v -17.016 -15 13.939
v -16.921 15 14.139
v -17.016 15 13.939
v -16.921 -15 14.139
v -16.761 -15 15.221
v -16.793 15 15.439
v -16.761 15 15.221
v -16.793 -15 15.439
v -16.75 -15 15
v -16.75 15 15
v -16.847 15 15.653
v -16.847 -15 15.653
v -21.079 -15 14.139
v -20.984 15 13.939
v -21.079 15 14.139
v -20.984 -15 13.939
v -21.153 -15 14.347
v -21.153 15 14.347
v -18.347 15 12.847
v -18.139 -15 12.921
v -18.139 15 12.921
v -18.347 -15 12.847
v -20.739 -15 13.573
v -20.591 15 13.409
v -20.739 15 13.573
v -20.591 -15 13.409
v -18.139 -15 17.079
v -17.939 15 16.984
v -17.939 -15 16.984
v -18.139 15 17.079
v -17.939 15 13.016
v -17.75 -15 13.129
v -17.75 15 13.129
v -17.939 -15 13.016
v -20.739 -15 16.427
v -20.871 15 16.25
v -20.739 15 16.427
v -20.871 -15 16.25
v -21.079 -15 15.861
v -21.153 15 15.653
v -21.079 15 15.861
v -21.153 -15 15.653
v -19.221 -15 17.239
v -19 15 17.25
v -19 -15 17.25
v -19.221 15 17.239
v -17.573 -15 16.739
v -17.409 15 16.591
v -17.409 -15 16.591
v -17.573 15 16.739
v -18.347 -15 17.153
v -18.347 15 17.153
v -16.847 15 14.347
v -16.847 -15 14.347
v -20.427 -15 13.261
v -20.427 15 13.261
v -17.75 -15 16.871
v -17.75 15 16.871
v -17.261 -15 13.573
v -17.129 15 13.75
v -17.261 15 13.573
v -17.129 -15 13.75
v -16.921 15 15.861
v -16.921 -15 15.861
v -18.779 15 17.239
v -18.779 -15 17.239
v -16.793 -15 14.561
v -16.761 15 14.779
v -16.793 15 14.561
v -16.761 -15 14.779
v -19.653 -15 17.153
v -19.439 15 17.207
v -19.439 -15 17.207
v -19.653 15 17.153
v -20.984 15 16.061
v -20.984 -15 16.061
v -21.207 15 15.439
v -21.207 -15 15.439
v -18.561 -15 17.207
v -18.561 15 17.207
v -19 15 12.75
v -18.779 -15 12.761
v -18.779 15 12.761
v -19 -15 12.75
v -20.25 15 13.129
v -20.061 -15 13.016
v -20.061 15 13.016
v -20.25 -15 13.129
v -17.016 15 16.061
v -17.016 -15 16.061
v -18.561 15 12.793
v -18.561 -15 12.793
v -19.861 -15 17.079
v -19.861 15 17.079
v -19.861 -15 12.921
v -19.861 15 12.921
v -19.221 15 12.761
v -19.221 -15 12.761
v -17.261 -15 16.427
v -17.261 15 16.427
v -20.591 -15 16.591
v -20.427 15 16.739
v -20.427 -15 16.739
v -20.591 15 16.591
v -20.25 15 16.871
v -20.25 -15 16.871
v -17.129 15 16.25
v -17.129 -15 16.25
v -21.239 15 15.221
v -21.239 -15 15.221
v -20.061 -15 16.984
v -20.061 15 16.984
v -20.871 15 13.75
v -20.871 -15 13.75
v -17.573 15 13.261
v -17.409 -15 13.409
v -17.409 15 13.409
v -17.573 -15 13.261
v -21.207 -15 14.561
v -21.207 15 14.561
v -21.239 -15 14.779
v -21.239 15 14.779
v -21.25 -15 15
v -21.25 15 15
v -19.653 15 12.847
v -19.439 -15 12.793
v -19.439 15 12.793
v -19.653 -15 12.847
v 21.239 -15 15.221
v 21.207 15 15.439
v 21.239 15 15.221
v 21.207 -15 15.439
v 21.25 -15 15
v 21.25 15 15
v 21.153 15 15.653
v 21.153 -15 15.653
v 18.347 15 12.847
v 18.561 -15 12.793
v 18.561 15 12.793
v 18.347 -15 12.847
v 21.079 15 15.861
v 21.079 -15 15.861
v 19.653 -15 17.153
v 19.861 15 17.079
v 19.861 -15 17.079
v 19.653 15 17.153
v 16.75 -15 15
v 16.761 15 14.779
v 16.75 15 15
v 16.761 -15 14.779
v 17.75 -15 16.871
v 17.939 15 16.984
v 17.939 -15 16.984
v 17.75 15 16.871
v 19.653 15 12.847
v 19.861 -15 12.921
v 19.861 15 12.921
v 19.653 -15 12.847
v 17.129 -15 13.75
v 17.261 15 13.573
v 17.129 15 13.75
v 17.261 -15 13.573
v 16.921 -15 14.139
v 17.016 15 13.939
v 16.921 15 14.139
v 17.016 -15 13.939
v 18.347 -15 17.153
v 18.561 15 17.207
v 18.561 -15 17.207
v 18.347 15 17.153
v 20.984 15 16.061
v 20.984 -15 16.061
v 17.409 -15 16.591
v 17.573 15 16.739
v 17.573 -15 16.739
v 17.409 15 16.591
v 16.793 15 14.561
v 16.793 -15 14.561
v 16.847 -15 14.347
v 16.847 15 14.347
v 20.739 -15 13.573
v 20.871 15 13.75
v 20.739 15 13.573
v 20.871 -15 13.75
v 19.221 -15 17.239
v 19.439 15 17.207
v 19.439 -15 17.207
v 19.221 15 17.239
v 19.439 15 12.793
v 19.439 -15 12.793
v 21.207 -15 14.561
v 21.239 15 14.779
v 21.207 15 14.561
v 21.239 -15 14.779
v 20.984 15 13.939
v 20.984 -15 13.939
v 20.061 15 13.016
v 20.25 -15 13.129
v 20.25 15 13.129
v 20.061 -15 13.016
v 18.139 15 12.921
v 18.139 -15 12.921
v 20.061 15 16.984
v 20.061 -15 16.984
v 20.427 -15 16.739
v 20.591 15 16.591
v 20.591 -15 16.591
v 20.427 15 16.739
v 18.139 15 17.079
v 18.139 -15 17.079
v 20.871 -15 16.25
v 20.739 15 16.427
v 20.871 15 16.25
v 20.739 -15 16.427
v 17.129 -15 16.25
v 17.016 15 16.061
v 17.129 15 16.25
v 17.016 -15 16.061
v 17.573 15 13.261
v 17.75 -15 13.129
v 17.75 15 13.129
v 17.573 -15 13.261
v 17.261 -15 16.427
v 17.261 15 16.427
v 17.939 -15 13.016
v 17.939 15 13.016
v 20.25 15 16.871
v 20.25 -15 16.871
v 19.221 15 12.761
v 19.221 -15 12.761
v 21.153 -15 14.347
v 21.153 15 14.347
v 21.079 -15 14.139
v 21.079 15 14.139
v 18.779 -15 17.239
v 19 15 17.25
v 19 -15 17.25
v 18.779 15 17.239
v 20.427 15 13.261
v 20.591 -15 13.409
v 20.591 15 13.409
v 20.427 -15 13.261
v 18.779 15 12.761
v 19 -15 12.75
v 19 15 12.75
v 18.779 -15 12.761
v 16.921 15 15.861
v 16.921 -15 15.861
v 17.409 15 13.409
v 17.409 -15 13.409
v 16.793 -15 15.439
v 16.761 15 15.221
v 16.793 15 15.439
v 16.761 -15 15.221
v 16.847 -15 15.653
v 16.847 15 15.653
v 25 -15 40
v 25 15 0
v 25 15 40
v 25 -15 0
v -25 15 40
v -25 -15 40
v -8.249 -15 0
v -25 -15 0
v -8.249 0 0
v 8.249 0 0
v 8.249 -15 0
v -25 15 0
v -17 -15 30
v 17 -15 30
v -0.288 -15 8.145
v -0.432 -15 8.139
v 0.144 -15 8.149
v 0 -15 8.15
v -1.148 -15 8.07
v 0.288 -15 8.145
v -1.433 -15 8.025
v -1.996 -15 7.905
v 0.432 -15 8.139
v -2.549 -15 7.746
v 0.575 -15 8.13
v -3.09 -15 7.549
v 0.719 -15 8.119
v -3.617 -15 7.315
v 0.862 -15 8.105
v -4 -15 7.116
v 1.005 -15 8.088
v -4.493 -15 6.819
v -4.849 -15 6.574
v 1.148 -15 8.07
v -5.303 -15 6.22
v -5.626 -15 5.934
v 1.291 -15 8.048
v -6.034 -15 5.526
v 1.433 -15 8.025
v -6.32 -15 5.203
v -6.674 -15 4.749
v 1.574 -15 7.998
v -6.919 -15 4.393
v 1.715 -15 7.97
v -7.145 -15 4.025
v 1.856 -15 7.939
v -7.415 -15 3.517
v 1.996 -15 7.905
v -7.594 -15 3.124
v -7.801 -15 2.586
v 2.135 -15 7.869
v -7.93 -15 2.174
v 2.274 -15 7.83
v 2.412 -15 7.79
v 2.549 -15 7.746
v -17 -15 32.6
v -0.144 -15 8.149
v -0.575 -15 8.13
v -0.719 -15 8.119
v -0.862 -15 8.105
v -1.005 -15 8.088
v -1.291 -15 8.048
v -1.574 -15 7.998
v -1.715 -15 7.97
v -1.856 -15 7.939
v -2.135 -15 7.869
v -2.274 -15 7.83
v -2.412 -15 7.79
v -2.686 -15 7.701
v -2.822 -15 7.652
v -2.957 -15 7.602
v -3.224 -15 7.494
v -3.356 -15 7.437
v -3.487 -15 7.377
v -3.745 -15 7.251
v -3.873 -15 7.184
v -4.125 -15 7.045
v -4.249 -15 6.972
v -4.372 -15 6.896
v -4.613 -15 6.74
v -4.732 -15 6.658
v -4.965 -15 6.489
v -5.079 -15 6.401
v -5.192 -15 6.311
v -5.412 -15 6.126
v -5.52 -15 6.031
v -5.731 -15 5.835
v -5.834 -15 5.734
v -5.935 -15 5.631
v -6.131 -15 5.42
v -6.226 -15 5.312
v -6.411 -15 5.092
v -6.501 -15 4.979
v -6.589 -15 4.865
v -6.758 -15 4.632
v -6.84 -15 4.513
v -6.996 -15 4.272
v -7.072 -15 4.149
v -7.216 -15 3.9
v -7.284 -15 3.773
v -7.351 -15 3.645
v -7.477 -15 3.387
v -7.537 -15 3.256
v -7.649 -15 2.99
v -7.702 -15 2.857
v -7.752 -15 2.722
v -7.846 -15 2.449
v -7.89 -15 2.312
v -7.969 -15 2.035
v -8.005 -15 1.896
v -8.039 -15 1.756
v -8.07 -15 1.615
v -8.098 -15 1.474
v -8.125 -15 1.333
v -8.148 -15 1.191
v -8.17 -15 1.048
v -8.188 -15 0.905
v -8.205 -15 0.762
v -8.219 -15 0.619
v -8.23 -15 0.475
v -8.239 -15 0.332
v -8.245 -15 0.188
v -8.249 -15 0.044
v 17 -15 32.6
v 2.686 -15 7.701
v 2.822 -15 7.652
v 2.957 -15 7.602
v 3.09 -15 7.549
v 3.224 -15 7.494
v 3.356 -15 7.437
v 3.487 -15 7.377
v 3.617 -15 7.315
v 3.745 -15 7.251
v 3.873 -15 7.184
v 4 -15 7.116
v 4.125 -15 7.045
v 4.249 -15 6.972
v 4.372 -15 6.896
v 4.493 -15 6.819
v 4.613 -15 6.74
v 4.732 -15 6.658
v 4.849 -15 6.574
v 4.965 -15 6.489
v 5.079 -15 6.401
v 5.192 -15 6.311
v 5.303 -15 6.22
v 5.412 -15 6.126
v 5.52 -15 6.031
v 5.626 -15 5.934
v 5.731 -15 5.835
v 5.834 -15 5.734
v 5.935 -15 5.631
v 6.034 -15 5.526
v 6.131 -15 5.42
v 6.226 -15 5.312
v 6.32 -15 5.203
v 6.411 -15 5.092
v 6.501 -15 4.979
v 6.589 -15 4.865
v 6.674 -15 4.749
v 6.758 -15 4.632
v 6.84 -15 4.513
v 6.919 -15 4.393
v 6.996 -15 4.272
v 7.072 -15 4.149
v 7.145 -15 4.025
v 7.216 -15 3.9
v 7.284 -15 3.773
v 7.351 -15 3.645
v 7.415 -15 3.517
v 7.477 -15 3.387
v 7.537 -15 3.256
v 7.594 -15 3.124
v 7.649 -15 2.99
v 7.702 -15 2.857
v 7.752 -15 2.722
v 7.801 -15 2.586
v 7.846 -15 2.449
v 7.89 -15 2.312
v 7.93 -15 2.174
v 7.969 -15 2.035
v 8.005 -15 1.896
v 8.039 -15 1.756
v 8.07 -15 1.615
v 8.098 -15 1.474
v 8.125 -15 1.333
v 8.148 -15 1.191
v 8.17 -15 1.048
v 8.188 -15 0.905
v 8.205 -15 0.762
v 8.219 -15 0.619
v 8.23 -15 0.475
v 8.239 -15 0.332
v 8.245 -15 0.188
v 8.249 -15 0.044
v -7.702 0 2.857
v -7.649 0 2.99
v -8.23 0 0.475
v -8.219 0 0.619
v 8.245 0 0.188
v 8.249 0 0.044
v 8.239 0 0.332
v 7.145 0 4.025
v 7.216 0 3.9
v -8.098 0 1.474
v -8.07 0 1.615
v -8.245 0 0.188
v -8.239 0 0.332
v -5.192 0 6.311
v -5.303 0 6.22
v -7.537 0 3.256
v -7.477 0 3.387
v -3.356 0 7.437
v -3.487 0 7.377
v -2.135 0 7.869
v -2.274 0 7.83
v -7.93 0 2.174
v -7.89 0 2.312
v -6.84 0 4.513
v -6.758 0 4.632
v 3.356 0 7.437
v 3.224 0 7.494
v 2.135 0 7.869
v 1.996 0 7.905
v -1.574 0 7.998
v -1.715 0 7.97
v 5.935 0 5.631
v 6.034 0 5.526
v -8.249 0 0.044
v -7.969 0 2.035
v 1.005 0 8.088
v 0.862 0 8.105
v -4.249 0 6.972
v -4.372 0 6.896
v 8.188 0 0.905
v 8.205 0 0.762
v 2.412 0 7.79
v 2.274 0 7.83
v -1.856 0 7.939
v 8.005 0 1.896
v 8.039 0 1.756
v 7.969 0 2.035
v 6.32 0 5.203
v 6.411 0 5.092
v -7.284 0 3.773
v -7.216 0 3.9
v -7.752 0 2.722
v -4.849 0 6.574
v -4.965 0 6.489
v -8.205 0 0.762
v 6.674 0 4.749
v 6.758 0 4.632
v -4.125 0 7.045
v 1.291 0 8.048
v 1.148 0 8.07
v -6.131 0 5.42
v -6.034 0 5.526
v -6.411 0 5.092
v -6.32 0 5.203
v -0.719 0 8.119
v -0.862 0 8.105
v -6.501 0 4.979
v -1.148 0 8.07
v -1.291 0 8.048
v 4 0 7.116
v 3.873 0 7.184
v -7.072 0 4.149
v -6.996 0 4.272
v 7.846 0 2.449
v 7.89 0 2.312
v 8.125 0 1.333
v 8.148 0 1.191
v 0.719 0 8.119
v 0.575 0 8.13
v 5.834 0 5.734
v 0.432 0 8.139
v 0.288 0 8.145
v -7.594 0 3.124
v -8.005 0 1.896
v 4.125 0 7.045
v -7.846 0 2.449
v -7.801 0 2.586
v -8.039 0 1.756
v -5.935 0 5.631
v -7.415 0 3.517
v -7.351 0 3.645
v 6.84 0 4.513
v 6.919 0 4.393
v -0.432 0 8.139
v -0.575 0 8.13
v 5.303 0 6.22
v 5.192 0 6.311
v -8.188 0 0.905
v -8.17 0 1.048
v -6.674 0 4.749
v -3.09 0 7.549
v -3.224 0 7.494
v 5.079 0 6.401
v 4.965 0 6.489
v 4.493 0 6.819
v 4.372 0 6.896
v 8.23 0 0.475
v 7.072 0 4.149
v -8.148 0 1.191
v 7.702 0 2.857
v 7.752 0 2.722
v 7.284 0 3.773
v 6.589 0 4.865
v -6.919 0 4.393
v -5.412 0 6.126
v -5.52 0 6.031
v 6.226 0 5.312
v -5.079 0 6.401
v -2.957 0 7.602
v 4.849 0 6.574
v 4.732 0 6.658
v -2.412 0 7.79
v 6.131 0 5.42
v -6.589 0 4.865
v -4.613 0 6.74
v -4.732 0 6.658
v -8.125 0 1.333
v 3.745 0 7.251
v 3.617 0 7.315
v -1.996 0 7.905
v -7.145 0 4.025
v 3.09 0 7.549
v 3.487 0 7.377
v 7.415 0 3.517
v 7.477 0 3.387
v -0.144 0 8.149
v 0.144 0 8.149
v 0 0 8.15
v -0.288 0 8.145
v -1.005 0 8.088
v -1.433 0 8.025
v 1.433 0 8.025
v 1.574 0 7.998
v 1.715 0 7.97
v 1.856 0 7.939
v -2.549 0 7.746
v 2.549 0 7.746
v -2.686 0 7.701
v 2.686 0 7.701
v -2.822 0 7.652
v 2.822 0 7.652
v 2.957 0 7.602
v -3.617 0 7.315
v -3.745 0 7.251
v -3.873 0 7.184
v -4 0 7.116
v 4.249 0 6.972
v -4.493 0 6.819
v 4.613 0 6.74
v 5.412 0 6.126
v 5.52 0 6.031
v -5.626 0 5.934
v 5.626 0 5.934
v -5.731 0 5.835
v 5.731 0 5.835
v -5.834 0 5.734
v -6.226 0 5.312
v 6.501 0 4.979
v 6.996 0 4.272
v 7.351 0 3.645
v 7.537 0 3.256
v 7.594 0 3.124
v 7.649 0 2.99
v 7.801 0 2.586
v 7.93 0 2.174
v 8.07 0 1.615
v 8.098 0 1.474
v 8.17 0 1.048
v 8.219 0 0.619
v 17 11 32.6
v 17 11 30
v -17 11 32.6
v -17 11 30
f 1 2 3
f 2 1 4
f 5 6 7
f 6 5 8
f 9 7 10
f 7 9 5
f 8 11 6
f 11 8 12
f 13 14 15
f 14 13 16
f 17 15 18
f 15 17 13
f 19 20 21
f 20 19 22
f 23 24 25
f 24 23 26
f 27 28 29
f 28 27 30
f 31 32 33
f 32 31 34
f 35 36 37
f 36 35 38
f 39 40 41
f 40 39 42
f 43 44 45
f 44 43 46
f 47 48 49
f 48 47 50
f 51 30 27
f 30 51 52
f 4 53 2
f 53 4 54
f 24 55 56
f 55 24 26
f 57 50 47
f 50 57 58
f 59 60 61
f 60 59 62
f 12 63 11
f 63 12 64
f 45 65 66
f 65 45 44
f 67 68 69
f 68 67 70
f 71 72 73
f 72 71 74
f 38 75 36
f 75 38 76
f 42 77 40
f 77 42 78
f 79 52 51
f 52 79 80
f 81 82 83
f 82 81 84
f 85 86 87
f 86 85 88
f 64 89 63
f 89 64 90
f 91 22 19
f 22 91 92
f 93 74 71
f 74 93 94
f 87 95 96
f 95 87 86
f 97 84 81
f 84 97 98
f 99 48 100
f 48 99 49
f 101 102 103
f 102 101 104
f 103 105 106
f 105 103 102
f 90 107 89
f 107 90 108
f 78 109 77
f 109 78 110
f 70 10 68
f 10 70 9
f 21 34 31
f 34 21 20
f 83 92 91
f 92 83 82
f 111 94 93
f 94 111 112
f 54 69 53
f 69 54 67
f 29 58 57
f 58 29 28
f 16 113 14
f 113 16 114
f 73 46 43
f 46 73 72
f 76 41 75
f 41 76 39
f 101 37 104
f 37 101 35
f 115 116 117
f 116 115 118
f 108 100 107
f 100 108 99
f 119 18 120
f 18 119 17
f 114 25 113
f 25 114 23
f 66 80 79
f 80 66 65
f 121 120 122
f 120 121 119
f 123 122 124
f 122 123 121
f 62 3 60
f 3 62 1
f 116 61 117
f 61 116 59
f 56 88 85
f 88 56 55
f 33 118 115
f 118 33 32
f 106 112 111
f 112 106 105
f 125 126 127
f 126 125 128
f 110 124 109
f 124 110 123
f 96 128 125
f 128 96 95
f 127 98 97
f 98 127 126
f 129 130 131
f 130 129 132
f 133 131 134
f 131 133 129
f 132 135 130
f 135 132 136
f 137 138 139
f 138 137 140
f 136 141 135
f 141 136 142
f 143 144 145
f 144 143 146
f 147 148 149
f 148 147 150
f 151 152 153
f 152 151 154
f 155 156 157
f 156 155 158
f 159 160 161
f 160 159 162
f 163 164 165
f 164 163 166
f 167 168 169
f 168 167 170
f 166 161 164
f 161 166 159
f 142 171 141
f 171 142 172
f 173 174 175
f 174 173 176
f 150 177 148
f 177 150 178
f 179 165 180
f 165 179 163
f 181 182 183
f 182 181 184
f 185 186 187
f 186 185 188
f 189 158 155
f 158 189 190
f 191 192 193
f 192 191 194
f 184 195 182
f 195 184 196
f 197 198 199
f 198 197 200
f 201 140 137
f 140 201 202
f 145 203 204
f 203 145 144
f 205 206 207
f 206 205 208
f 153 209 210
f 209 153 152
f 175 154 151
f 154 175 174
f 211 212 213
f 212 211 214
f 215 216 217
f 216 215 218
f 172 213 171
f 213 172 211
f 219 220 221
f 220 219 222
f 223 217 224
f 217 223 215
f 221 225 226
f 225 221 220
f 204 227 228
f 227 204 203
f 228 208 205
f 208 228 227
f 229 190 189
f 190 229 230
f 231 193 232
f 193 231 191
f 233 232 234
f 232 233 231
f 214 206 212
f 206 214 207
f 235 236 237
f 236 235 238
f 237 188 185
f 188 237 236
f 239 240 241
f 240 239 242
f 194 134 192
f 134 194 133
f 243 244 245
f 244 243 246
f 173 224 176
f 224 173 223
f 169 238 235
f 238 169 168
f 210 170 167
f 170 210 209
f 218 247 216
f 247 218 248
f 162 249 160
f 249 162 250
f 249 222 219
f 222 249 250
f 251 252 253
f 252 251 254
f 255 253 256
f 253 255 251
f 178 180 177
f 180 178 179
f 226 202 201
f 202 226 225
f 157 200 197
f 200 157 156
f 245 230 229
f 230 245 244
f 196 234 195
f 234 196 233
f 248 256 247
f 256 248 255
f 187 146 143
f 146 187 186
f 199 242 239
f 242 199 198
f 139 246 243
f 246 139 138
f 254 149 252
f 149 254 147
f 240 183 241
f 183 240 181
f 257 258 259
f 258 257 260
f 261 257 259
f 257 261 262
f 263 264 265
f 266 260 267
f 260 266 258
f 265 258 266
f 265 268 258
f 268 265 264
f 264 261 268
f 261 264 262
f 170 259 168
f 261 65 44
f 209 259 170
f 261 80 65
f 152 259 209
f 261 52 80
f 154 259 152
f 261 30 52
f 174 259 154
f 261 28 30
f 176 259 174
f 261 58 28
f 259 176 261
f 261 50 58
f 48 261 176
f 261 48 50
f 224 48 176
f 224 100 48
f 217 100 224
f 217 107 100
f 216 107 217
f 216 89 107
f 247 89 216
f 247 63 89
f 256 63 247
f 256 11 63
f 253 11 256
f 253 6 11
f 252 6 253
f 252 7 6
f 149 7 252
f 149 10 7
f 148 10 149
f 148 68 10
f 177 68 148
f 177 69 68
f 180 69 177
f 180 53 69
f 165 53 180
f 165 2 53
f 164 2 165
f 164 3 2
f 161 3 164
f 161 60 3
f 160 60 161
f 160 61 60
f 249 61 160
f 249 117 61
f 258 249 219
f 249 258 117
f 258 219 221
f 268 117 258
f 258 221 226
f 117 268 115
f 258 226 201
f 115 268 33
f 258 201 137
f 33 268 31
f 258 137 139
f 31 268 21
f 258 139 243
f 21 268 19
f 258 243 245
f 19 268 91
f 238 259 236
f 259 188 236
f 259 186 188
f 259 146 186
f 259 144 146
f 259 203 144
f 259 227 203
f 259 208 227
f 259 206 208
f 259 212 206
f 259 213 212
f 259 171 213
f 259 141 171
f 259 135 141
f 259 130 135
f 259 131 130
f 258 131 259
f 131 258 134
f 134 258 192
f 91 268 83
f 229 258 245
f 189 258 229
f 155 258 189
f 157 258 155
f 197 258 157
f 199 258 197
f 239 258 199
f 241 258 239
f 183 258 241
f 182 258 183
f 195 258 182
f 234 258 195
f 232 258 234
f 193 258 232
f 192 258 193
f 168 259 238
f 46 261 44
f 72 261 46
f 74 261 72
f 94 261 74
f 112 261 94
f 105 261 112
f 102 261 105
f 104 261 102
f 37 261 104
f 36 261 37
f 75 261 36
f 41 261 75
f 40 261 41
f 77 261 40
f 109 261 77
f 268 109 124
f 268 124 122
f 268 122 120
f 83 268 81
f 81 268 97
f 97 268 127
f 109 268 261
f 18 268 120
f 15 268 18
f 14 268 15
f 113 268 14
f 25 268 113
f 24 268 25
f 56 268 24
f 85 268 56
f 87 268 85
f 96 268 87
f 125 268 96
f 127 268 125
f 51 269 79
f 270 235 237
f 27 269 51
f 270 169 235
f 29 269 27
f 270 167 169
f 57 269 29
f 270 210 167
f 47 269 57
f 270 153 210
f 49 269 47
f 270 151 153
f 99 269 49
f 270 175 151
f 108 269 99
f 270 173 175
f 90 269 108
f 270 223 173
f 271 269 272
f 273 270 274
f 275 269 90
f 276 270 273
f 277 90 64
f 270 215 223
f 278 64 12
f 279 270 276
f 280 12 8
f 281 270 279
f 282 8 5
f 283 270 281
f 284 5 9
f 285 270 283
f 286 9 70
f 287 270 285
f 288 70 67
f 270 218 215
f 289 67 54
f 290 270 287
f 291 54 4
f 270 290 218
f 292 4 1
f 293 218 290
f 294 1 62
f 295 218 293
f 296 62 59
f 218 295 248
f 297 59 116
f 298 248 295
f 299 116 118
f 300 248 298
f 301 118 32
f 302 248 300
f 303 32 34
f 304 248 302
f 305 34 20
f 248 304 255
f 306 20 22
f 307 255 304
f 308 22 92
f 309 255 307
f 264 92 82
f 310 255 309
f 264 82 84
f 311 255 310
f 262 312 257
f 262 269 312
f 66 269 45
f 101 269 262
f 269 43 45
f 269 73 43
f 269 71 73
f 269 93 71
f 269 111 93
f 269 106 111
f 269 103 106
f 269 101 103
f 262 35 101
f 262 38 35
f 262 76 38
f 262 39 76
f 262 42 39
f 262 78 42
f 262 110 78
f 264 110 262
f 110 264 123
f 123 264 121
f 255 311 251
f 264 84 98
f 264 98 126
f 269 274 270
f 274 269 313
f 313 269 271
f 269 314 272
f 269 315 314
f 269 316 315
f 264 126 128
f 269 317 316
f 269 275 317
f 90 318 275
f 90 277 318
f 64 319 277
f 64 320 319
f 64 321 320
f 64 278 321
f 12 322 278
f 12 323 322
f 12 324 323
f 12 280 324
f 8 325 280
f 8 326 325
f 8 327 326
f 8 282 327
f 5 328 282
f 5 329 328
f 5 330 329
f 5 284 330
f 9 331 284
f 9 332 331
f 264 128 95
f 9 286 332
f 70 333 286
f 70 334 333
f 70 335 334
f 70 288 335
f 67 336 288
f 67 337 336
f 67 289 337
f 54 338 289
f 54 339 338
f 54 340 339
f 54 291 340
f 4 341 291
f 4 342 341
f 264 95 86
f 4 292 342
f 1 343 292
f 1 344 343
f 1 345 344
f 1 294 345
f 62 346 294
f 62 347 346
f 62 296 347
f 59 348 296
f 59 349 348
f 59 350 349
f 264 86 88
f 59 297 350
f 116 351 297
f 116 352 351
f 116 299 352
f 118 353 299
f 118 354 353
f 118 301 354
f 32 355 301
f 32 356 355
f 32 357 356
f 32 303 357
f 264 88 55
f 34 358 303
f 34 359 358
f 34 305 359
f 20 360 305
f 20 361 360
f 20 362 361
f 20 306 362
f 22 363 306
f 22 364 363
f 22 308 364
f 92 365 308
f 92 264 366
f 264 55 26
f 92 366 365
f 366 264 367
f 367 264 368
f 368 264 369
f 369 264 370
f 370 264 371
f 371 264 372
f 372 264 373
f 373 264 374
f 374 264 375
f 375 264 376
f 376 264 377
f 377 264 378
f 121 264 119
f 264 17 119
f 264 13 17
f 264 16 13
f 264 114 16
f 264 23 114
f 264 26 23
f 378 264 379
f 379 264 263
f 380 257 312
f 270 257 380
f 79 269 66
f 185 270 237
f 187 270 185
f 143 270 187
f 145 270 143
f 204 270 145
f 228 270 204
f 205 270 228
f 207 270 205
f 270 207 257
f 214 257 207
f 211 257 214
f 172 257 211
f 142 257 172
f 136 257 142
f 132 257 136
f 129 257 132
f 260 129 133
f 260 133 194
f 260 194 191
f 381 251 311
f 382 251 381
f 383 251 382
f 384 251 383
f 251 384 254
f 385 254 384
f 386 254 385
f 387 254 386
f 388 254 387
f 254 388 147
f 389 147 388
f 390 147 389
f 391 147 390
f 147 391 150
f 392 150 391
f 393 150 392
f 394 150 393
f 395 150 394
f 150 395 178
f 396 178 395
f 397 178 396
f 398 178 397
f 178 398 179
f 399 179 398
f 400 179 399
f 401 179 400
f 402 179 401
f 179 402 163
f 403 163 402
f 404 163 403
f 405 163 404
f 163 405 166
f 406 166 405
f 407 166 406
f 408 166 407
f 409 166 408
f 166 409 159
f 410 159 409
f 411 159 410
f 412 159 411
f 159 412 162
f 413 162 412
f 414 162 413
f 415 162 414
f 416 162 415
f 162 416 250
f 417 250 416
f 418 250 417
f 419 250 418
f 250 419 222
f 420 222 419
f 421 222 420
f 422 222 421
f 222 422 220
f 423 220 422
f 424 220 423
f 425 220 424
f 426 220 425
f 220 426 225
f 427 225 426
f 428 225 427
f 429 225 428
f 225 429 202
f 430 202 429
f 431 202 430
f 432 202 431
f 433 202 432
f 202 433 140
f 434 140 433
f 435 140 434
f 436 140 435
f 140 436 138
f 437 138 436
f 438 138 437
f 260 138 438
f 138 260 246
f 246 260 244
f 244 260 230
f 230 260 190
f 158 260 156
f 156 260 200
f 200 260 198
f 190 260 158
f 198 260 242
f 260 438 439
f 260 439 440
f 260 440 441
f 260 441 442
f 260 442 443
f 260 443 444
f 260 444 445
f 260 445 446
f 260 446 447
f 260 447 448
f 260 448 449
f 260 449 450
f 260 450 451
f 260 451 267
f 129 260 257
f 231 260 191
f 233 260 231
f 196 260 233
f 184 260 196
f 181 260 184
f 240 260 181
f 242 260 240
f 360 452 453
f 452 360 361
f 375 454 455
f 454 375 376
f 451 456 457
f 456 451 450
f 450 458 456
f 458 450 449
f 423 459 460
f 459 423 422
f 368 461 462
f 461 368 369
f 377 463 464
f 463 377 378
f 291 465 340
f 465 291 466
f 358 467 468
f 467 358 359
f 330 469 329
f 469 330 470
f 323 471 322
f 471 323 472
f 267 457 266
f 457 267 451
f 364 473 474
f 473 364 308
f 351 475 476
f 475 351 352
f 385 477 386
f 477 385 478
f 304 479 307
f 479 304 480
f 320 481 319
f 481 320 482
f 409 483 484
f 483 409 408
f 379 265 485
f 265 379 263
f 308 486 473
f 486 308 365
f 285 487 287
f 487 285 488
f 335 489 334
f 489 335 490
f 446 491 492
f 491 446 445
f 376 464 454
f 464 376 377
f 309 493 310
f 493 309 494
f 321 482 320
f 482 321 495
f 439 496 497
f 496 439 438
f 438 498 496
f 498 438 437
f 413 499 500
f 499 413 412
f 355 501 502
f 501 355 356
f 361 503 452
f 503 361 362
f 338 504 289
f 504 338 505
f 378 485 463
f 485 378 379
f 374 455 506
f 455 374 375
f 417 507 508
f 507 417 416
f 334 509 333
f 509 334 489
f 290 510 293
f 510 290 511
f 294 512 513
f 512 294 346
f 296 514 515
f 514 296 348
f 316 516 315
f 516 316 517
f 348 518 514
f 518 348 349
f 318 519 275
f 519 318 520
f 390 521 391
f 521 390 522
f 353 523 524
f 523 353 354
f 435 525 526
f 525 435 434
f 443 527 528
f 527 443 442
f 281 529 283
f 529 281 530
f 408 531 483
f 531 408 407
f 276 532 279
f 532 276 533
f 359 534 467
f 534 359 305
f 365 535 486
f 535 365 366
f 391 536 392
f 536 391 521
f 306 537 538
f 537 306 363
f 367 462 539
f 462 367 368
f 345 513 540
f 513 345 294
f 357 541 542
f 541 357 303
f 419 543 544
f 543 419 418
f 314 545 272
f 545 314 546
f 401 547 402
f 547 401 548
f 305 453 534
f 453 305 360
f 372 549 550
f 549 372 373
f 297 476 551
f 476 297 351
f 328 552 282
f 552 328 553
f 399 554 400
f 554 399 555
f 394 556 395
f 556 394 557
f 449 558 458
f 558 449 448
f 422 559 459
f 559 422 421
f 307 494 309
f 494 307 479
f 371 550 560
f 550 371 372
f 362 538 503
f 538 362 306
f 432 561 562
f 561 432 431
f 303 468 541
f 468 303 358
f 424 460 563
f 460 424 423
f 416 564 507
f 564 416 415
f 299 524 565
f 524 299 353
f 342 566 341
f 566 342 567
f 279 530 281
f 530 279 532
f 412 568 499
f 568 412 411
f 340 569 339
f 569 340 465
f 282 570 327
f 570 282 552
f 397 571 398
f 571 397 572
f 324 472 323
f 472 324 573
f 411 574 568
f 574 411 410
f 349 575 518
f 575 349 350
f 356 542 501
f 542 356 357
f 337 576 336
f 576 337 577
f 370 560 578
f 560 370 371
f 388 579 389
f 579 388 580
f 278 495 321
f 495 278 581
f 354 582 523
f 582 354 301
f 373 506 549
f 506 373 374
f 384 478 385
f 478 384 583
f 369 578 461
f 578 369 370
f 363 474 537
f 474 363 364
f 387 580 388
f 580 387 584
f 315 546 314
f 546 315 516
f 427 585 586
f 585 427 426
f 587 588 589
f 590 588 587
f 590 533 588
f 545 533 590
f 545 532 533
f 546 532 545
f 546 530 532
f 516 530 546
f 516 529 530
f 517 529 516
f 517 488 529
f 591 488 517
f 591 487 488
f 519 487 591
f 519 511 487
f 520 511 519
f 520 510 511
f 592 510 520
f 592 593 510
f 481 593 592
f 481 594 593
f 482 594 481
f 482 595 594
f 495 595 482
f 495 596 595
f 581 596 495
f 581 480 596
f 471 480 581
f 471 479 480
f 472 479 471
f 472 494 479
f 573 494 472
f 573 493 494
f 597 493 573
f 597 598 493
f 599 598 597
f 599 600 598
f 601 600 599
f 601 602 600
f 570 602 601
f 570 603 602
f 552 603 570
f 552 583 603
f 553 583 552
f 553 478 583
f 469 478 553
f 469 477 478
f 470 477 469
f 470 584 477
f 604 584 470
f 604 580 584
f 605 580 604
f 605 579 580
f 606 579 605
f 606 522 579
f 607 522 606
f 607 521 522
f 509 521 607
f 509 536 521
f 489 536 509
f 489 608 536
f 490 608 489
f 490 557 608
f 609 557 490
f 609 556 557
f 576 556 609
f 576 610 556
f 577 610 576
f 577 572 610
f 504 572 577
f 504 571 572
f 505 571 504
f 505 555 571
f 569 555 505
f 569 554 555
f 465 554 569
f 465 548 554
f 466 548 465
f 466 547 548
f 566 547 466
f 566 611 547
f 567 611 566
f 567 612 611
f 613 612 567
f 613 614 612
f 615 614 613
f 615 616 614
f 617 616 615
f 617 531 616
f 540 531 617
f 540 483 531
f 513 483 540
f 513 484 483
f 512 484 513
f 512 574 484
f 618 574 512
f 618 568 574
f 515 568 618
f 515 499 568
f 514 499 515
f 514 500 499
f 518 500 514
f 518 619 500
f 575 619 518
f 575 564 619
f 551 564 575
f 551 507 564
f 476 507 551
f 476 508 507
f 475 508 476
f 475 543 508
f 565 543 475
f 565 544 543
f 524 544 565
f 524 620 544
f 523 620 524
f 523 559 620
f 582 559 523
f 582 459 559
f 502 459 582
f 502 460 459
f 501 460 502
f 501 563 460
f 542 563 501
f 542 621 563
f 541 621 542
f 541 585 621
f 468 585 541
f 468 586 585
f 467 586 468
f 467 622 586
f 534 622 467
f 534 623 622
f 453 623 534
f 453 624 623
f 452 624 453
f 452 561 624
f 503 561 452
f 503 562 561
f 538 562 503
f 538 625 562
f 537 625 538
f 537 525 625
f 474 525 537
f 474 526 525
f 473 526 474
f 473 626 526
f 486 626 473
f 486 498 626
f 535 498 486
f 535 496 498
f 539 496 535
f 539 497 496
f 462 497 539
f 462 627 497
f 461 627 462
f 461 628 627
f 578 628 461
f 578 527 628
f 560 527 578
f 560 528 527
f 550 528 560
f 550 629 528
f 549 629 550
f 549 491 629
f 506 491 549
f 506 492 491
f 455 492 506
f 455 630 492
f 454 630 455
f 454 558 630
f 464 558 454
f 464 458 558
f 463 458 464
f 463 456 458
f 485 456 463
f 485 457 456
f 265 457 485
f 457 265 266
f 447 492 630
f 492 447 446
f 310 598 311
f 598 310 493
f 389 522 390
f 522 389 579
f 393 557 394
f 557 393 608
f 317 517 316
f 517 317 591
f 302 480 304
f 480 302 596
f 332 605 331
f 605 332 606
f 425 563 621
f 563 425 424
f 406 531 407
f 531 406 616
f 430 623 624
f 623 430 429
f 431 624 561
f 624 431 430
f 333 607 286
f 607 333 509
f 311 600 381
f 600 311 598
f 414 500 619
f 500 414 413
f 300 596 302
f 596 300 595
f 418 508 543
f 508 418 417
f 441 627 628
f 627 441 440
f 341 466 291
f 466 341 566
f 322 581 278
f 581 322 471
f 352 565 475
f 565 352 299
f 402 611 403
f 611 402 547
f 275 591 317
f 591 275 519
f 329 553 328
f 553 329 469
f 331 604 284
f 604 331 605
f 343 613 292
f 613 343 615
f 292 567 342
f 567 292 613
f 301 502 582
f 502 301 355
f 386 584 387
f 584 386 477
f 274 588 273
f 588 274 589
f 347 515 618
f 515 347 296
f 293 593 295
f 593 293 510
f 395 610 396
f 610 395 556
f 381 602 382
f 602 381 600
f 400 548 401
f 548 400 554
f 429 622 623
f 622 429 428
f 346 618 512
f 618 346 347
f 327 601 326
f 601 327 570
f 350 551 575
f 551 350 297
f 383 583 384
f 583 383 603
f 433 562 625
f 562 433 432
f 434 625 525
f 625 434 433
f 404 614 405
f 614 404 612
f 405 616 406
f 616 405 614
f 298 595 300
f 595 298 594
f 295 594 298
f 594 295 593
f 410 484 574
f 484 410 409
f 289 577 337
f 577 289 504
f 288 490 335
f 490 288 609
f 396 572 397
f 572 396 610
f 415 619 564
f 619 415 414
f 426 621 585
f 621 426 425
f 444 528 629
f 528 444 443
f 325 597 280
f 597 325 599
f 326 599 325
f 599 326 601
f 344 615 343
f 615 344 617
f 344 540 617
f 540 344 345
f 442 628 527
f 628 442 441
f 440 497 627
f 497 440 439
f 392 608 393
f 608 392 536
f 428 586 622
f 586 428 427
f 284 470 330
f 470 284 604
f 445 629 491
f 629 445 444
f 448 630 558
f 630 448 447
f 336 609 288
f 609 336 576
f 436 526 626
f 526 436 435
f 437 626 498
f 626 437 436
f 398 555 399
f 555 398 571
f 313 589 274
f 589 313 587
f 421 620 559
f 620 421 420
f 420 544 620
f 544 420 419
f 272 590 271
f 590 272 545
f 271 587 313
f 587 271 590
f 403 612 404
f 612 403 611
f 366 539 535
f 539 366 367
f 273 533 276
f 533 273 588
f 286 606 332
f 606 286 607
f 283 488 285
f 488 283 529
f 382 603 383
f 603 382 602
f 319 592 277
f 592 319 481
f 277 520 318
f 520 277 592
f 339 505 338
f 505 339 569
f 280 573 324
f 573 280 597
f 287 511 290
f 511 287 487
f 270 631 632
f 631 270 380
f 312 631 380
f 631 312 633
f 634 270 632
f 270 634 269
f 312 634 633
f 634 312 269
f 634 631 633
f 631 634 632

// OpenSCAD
$fn = 64;

// Dimensions
block_width = 50;      // X
block_depth = 30;      // Y
block_height = 40;     // Z
barrel_radius = 8.25;  // half of 16.5 mm width
barrel_channel_length = 15;  // from y=0 to y=-15
flange_slot_width = 34;
flange_slot_height = 2.6;
flange_slot_z_start = 30;
screw_hole_diameter = 4.5;
screw_hole_x = [-19, 19];
screw_hole_z = 15;

difference() {
    // Main block: 50 x 30 x 40, centered on origin in XY, standing on bed (z=0 to 40)
    translate([0, 0, 20]) {
        cube([block_width, block_depth, block_height], center=true);
    }
    
    // Barrel channel: half-cylinder from y=-15 (front) to y=0 (back)
    // Flat side at z=0, curved side up to z=8.25
    translate([0, 0, -0.1]) {
        rotate([90, 0, 0]) {
            linear_extrude(height = barrel_channel_length + 0.1, center = false) {
                polygon([
                    for (angle = [0 : 1 : 180]) 
                        [barrel_radius * cos(angle), barrel_radius * sin(angle)]
                ]);
            }
        }
    }
    
    // Flange slot: 34 mm wide (centered in X), 2.6 mm tall (z=30 to 32.6)
    // Cut from front face (y=-15) back to y=11, depth exactly 26 mm
    translate([0, -2, 31.3]) {
        cube([flange_slot_width, 26, flange_slot_height], center=true);
    }
    
    // Screw holes: 4.5 mm diameter, at x=-19 and x=19, z=15
    // Go straight through from front to back (along Y)
    for (x = screw_hole_x) {
        translate([x, 0, screw_hole_z]) {
            rotate([90, 0, 0]) {
                cylinder(h=30.1, r=screw_hole_diameter/2, center=true);
            }
        }
    }
}
